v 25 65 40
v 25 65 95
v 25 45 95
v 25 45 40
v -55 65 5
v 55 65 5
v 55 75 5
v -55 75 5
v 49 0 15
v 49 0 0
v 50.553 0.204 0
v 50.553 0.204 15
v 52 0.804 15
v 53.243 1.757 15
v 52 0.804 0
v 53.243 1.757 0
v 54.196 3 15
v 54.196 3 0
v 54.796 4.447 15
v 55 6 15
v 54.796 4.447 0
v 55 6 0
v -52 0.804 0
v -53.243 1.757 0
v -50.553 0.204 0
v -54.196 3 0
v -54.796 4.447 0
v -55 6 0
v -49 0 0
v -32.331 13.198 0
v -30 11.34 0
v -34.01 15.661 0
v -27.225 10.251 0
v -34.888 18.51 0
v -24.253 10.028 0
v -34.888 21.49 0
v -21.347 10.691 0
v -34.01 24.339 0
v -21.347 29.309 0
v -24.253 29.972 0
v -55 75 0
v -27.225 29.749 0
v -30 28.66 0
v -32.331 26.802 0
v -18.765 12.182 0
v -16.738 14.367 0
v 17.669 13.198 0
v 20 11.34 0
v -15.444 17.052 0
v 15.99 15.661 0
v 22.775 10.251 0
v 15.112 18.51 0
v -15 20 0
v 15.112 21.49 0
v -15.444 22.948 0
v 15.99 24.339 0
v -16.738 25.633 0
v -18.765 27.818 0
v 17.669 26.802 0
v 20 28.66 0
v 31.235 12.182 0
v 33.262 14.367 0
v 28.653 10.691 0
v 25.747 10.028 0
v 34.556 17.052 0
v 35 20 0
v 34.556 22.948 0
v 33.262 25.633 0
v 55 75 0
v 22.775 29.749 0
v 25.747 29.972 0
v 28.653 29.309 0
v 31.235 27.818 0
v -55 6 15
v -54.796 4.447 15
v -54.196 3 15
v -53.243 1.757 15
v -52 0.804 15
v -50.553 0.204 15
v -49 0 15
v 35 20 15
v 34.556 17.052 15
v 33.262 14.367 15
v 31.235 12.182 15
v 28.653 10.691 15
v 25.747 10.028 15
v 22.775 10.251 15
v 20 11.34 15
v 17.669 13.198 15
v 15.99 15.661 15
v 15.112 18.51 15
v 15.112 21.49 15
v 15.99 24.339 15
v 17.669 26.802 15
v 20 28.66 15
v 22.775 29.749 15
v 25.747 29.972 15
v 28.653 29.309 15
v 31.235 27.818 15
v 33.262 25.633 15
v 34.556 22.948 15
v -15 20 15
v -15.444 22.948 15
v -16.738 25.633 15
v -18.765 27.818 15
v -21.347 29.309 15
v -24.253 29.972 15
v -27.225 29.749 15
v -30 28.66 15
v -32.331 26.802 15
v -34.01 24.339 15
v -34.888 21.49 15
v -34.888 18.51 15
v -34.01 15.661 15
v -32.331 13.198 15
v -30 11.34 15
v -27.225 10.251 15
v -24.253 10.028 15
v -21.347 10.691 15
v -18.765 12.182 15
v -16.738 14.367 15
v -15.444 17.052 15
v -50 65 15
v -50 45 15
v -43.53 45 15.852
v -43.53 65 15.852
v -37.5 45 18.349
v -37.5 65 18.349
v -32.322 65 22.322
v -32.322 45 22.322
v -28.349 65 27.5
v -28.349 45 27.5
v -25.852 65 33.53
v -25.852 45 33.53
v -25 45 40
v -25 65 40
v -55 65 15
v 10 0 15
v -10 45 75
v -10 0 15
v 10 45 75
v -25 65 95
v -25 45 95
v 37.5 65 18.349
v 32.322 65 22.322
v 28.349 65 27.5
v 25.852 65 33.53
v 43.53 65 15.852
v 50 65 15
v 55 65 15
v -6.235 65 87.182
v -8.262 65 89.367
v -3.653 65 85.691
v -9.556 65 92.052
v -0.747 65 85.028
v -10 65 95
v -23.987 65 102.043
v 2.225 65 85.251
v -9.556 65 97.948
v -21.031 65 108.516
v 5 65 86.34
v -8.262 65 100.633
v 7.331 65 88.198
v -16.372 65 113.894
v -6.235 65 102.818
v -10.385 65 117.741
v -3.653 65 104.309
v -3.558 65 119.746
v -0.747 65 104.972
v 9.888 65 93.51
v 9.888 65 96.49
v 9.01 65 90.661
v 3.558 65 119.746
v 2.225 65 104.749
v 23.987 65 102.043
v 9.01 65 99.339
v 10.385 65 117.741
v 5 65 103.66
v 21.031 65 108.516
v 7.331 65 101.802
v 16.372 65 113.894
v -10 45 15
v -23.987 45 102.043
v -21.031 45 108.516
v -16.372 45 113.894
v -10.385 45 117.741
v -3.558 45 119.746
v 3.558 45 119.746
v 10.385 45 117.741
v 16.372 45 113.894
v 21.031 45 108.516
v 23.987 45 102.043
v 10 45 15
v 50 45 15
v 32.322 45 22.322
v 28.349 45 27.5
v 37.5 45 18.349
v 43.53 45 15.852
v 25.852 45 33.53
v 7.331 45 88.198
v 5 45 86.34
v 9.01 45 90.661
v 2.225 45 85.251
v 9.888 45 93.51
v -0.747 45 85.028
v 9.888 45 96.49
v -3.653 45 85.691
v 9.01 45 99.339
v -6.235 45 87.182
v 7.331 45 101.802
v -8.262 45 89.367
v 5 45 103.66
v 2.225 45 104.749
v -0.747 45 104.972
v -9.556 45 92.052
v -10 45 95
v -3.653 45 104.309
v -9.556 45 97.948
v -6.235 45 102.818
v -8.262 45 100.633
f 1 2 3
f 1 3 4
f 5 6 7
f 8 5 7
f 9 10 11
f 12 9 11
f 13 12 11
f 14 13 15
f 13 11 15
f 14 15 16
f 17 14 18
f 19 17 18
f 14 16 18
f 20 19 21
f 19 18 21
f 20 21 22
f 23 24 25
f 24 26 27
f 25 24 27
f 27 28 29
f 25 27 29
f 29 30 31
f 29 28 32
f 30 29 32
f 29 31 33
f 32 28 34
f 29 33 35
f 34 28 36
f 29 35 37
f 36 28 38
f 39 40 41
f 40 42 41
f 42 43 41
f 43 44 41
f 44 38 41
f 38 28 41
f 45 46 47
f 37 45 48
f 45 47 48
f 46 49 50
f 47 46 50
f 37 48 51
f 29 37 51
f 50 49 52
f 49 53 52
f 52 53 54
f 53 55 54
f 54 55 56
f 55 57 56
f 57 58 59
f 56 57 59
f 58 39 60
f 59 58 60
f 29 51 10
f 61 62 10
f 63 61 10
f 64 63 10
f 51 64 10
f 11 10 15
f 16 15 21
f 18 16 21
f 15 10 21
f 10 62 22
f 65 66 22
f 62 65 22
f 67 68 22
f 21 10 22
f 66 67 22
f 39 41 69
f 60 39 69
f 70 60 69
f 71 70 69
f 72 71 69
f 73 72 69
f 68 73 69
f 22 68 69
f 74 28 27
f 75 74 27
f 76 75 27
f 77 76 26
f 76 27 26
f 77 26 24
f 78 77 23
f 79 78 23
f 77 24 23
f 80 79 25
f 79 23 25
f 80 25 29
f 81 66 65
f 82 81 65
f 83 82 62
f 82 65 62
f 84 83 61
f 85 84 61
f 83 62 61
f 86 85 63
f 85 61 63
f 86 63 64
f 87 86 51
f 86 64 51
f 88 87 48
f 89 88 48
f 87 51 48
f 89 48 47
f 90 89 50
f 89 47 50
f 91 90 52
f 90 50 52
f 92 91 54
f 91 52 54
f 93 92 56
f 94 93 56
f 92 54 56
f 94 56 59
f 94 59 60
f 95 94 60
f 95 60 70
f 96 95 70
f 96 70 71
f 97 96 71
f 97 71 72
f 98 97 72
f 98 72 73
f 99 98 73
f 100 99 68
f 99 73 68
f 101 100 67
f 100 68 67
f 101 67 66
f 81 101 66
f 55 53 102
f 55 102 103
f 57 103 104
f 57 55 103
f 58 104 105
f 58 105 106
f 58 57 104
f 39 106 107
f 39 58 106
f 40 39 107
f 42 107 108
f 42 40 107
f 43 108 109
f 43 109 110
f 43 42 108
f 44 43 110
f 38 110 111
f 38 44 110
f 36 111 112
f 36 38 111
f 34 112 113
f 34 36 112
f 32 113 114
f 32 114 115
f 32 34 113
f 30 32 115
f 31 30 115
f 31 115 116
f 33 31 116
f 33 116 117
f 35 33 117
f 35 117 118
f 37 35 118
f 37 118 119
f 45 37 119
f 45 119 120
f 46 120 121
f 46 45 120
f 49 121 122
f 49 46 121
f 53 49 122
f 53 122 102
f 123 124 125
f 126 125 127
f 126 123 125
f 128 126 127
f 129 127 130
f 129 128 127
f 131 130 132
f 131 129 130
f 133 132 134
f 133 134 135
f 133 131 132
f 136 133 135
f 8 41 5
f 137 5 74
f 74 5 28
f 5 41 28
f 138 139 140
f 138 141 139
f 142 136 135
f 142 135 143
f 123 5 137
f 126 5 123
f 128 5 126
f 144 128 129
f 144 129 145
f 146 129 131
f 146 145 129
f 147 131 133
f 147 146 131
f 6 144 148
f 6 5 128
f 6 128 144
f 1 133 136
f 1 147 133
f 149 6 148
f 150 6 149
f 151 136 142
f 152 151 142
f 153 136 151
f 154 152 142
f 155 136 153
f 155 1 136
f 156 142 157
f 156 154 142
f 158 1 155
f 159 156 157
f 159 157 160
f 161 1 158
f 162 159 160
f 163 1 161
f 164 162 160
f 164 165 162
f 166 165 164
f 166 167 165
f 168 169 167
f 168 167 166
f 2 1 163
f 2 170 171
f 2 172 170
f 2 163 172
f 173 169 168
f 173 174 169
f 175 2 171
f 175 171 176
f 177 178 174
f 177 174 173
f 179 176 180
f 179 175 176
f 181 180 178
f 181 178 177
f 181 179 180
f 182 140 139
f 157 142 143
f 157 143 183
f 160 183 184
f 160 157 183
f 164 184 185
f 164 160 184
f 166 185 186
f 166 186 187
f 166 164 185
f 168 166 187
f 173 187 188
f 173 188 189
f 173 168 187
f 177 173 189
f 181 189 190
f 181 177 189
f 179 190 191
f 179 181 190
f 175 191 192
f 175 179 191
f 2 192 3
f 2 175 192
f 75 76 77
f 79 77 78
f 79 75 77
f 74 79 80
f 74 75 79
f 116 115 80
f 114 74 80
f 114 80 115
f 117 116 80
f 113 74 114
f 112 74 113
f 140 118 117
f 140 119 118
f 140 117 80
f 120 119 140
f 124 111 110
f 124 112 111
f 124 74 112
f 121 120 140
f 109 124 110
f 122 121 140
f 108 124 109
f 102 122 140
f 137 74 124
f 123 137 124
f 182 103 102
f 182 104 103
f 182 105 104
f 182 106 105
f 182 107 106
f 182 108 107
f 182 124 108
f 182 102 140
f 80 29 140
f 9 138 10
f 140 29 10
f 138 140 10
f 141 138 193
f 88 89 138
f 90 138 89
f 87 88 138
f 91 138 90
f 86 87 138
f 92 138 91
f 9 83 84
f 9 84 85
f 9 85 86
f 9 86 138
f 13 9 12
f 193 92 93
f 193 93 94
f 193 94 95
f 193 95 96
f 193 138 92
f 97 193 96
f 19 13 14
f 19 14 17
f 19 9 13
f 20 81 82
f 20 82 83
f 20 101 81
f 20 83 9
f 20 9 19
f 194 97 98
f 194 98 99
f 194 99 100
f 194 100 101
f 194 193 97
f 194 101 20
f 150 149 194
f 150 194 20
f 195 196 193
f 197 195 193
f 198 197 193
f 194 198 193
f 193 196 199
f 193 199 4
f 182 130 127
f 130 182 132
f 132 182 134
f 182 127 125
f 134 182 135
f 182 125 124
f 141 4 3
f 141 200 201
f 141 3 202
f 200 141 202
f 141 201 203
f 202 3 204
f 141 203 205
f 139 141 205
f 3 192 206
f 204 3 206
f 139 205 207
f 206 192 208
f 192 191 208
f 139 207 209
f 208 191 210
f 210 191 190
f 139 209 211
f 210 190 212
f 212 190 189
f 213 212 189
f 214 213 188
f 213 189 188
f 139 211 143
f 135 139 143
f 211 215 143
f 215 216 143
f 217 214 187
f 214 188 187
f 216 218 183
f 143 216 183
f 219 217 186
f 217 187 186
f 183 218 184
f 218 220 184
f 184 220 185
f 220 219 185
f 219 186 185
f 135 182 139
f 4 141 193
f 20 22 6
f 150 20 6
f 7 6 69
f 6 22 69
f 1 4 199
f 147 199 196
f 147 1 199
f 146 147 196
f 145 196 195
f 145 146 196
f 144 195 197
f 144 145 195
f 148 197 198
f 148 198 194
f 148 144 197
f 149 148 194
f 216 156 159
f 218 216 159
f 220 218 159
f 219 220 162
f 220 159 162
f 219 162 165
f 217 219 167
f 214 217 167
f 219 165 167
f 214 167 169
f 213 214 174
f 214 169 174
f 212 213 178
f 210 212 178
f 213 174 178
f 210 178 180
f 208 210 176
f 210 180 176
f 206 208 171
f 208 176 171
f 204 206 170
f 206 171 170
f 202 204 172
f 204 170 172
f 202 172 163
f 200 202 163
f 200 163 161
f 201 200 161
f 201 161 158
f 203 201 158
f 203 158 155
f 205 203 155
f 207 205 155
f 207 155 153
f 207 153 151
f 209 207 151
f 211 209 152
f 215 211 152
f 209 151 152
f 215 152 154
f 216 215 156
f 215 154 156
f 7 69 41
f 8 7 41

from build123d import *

# Parameters (mm, degrees)
F0_R          = 10
F1_DEPTH      = 15
F3_START      = -10
F2_R          = 10
F3_DEPTH      = 20
F5_DEPTH      = 10
F5_DEPTH_BACK = 10
F6_W          = 10
F6_H          = 10
F7_DEPTH      = 110.001


with BuildPart() as f1:
    # F0 (on Top) → F1 (new body)
    with BuildSketch(Plane.XY):
        with BuildLine():
            Line((55, 75), (-55, 75))
            Line((-55, 75), (-55, 6))
            ThreePointArc((-55, 6), (-53.2426406871, 1.7573593129), (-49, 0))
            Line((-49, 0), (49, 0))
            ThreePointArc((49, 0), (53.2426406871, 1.7573593129), (55, 6))
            Line((55, 6), (55, 75))
        make_face()
        with Locations((-25, 20)):
            Circle(F0_R, mode=Mode.SUBTRACT)
        with BuildLine():
            ThreePointArc((15, 20), (25, 30), (35, 20))
            ThreePointArc((35, 20), (25, 10), (15, 20))
        make_face(mode=Mode.SUBTRACT)
    extrude(amount=F1_DEPTH)

    # F2 (on face) → F3 (join)
    with BuildSketch(Plane(origin=(0, 75, 0), x_dir=(-1, 0, 0), z_dir=(0, 1, 0)).offset(F3_START)):
        with BuildLine():
            ThreePointArc((50, 15), (32.3223304703, 22.3223304703), (25, 40))
            Line((25, 40), (25, 95))
            ThreePointArc((25, 95), (0, 120), (-25, 95))
            Line((-25, 95), (-25, 40))
            ThreePointArc((-25, 40), (-32.3223304703, 22.3223304703), (-50, 15))
            Line((-50, 15), (50, 15))
        make_face()
        with Locations((0, 95)):
            Circle(F2_R, mode=Mode.SUBTRACT)
    extrude(amount=-F3_DEPTH)

    # F4 (on Right) → F5 (join, two sides)
    with BuildSketch(Plane.YZ) as f5_sk:
        Polygon((45, 75), (0, 15), (45, 15), align=None)
    extrude(amount=F5_DEPTH)
    extrude(f5_sk.sketch, amount=-F5_DEPTH_BACK)

    # F6 (on face) → F7 (cut, through all)
    with BuildSketch(Plane.YZ.offset(55)):
        with Locations((70, 10)):
            Rectangle(F6_W, F6_H)
    extrude(amount=-F7_DEPTH, mode=Mode.SUBTRACT)


solid = f1.part
